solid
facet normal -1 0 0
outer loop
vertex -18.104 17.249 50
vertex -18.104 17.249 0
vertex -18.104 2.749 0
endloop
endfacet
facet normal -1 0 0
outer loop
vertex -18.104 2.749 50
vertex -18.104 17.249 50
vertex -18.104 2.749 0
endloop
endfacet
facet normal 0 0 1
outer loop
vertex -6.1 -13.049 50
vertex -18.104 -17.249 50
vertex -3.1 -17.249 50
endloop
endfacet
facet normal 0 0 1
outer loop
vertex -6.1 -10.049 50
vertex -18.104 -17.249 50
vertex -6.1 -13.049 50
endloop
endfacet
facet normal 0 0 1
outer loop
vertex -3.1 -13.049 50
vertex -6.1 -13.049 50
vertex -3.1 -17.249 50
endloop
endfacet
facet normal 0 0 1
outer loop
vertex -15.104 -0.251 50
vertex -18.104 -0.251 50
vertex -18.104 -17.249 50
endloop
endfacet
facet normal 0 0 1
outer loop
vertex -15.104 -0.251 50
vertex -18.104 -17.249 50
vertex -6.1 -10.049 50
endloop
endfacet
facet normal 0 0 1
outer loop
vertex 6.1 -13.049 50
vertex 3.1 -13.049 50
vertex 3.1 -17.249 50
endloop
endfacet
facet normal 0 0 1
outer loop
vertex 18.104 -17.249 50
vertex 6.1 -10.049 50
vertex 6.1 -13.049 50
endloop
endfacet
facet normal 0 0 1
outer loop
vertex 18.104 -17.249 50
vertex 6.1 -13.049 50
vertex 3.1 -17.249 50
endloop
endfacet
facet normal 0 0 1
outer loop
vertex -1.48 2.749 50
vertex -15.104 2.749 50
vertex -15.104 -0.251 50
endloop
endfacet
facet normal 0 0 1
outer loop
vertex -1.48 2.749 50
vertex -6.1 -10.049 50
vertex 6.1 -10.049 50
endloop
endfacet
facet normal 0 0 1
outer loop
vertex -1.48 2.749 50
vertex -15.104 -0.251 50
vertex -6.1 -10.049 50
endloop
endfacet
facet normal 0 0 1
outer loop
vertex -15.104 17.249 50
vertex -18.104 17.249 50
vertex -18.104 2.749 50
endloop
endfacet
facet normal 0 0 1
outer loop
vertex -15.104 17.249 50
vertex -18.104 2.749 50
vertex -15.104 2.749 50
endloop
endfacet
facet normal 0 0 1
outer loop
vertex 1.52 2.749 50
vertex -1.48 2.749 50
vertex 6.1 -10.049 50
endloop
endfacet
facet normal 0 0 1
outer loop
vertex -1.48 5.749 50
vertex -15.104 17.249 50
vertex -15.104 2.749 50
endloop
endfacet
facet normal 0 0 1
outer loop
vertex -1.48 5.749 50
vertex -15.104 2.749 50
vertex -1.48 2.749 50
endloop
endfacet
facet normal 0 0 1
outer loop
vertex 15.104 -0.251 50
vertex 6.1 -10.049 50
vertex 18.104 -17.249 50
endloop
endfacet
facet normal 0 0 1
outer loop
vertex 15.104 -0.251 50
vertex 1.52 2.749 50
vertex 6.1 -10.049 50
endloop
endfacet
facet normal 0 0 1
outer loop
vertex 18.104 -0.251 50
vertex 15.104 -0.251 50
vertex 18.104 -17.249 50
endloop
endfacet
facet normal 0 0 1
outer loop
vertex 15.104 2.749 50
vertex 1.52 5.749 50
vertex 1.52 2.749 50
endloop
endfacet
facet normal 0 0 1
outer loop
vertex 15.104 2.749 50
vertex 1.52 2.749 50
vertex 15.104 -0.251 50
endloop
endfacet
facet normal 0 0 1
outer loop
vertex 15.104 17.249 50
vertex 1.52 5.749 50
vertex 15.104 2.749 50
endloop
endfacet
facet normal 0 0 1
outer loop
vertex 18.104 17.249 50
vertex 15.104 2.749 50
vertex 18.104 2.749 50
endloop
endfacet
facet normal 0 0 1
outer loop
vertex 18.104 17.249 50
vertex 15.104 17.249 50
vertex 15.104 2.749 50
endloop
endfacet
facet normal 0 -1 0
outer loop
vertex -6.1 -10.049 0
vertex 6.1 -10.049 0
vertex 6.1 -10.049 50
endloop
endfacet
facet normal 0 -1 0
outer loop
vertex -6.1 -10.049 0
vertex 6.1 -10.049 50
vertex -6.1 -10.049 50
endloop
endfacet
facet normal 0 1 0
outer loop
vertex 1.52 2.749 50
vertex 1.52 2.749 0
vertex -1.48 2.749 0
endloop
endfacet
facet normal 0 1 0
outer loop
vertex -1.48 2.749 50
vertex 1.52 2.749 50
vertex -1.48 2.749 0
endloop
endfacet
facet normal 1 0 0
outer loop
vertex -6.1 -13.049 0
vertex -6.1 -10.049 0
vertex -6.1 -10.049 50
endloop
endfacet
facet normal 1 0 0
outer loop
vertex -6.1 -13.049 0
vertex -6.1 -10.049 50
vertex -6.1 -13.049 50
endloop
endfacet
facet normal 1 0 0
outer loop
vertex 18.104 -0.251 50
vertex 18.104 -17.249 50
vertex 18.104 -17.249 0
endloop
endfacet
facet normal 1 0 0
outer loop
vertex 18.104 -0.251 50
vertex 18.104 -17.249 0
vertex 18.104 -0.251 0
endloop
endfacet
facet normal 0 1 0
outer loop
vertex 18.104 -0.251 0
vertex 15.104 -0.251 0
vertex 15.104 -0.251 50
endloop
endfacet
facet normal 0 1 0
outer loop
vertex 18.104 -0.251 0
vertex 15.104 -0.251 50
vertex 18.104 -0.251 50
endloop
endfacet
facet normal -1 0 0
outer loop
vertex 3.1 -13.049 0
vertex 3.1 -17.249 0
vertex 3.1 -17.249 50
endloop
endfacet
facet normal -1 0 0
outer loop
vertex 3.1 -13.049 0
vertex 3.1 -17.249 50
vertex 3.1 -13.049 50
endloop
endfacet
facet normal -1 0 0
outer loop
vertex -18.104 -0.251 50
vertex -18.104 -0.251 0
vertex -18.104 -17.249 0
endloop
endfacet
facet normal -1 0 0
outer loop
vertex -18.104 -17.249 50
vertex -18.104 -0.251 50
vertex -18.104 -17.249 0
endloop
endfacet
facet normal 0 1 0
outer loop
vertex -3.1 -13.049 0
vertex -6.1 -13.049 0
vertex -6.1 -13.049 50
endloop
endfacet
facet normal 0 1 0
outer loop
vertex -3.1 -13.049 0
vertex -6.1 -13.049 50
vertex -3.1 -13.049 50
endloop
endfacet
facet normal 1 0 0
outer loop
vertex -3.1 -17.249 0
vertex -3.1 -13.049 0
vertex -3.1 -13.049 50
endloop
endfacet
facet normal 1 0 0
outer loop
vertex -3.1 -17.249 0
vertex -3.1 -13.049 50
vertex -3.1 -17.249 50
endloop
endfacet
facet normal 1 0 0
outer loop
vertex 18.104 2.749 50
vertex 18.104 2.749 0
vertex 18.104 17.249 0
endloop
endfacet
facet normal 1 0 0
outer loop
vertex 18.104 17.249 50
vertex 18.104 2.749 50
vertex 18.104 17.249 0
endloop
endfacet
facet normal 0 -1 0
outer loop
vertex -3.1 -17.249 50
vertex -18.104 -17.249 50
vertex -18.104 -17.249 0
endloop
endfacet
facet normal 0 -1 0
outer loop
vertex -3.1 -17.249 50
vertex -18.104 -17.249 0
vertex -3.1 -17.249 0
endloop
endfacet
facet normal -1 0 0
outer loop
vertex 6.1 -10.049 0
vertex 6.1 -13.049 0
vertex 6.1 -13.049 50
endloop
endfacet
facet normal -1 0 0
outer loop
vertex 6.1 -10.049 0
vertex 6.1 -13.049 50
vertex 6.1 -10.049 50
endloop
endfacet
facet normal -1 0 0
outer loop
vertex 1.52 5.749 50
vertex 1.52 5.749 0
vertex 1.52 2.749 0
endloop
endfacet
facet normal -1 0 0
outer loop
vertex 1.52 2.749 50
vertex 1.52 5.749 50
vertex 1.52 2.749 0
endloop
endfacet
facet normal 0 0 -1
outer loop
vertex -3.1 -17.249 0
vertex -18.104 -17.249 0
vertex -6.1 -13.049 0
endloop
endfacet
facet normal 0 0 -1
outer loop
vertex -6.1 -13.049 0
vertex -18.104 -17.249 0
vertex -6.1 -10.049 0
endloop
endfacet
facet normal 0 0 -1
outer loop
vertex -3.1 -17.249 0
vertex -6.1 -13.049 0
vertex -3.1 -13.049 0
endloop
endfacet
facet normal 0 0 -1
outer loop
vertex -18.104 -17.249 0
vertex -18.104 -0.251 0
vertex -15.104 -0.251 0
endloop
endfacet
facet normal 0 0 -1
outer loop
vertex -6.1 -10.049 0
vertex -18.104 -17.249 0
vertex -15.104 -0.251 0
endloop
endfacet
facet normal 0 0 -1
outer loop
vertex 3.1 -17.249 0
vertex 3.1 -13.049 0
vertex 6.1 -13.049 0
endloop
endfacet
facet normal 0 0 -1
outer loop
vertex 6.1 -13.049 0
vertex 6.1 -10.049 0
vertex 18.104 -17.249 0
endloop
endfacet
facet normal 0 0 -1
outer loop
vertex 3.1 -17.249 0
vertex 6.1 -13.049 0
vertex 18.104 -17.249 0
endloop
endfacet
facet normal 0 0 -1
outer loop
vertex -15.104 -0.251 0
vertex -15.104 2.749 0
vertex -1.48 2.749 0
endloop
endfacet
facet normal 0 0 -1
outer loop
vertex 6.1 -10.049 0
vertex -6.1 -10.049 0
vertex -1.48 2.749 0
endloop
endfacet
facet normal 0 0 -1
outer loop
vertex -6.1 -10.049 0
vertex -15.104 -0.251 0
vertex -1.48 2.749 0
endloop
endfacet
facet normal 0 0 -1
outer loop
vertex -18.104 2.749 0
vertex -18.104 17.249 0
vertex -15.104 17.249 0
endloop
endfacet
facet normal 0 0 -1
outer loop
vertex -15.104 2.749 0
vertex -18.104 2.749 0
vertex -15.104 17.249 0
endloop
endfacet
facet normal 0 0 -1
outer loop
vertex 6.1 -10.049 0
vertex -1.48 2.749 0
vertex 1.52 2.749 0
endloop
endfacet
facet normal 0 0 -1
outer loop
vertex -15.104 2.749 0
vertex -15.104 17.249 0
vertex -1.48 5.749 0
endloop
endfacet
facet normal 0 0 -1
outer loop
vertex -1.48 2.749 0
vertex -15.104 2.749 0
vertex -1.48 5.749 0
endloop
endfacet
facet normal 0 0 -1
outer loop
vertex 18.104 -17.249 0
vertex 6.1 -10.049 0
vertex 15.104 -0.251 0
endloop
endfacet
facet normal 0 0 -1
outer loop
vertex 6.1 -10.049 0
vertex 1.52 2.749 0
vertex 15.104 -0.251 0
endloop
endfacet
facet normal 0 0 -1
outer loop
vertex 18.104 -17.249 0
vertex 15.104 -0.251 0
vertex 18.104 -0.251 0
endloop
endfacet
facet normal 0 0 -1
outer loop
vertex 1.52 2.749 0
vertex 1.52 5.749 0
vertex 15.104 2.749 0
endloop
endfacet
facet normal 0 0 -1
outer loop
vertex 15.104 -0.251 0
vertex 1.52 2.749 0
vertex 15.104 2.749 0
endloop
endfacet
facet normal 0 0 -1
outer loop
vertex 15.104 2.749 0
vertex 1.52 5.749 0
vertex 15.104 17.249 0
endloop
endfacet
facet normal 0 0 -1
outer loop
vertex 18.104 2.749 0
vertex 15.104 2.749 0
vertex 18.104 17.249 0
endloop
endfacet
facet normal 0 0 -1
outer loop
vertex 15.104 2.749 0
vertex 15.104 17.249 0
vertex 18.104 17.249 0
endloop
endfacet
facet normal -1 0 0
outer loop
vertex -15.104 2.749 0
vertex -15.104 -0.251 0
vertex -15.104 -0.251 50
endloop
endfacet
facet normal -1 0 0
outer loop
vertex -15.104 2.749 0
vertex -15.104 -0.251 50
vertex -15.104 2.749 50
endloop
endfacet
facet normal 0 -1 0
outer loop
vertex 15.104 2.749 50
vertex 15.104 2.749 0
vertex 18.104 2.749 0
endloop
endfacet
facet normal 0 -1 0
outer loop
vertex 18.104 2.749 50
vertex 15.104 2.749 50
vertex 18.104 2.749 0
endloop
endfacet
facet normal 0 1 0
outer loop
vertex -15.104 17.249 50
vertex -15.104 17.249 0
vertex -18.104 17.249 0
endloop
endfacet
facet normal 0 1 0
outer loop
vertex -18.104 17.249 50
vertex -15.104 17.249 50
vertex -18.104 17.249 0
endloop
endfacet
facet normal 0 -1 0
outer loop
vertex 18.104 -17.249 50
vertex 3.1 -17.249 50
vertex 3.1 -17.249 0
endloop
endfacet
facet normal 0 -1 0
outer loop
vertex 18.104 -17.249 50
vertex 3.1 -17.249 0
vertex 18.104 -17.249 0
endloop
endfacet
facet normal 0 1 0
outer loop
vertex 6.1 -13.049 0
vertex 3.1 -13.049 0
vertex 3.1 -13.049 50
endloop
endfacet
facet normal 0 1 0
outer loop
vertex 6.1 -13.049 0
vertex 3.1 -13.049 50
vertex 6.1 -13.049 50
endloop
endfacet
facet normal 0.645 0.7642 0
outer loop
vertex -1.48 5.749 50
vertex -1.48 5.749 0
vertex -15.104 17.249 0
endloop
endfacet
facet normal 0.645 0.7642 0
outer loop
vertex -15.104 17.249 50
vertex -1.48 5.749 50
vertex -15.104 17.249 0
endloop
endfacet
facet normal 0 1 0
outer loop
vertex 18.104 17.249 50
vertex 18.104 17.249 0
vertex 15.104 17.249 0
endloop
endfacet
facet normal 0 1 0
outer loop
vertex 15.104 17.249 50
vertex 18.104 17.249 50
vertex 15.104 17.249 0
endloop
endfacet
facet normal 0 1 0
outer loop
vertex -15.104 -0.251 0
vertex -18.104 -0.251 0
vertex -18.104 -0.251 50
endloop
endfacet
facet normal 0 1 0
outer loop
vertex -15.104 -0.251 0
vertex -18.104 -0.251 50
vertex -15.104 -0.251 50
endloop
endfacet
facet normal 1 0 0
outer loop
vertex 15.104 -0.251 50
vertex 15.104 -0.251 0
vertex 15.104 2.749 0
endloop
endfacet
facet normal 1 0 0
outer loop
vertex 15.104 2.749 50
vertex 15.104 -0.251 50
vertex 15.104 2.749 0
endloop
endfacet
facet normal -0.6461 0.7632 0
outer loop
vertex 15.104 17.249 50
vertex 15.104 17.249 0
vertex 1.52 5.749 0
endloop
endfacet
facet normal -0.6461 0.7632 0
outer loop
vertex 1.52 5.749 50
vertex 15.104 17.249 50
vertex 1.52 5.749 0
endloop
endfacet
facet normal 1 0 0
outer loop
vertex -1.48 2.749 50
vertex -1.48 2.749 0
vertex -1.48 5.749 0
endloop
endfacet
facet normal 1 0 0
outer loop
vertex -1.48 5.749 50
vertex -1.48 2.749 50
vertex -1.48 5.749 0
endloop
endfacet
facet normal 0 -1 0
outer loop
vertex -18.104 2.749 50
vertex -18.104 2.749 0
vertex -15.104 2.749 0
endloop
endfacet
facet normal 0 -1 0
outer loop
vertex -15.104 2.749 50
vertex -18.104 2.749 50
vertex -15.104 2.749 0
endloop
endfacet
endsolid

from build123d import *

# Parameters (mm, degrees)
F1_DEPTH = 50
F3_DEPTH = 50
F4_W     = 3.671517
F4_H     = 3
F4_W_2   = 6.401138
F5_DEPTH = 50


with BuildPart() as f1:
    # F0 (on Top) → F1 (new body)
    with BuildSketch(Plane.XY):
        Polygon((18.104074, -17.248757), (18.104074, 17.248757), (15.104074, 17.248757), (1.519567, 5.748757), (1.519567, 2.748757), (-1.480433, 2.748757), (-1.480433, 5.748757), (-15.104074, 17.248757), (-18.104074, 17.248757), (-18.104074, -17.248757), align=None)
    extrude(amount=F1_DEPTH)

    # F2 (on Top) → F3 (cut)
    with BuildSketch(Plane.XY):
        Polygon((6.1, -10.048757), (-6.1, -10.048757), (-6.1, -13.048757), (-3.1, -13.048757), (-3.1, -21.213451), (3.1, -21.213451), (3.1, -13.048757), (6.1, -13.048757), align=None)
    extrude(amount=F3_DEPTH, mode=Mode.SUBTRACT)

    # F4 (on Top) → F5 (cut)
    with BuildSketch(Plane.XY):
        with Locations((-16.939832, 1.248757)):
            Rectangle(F4_W, F4_H)
        with Locations((18.304643, 1.248757)):
            Rectangle(F4_W_2, F4_H)
    extrude(amount=F5_DEPTH, mode=Mode.SUBTRACT)


solid = f1.part
